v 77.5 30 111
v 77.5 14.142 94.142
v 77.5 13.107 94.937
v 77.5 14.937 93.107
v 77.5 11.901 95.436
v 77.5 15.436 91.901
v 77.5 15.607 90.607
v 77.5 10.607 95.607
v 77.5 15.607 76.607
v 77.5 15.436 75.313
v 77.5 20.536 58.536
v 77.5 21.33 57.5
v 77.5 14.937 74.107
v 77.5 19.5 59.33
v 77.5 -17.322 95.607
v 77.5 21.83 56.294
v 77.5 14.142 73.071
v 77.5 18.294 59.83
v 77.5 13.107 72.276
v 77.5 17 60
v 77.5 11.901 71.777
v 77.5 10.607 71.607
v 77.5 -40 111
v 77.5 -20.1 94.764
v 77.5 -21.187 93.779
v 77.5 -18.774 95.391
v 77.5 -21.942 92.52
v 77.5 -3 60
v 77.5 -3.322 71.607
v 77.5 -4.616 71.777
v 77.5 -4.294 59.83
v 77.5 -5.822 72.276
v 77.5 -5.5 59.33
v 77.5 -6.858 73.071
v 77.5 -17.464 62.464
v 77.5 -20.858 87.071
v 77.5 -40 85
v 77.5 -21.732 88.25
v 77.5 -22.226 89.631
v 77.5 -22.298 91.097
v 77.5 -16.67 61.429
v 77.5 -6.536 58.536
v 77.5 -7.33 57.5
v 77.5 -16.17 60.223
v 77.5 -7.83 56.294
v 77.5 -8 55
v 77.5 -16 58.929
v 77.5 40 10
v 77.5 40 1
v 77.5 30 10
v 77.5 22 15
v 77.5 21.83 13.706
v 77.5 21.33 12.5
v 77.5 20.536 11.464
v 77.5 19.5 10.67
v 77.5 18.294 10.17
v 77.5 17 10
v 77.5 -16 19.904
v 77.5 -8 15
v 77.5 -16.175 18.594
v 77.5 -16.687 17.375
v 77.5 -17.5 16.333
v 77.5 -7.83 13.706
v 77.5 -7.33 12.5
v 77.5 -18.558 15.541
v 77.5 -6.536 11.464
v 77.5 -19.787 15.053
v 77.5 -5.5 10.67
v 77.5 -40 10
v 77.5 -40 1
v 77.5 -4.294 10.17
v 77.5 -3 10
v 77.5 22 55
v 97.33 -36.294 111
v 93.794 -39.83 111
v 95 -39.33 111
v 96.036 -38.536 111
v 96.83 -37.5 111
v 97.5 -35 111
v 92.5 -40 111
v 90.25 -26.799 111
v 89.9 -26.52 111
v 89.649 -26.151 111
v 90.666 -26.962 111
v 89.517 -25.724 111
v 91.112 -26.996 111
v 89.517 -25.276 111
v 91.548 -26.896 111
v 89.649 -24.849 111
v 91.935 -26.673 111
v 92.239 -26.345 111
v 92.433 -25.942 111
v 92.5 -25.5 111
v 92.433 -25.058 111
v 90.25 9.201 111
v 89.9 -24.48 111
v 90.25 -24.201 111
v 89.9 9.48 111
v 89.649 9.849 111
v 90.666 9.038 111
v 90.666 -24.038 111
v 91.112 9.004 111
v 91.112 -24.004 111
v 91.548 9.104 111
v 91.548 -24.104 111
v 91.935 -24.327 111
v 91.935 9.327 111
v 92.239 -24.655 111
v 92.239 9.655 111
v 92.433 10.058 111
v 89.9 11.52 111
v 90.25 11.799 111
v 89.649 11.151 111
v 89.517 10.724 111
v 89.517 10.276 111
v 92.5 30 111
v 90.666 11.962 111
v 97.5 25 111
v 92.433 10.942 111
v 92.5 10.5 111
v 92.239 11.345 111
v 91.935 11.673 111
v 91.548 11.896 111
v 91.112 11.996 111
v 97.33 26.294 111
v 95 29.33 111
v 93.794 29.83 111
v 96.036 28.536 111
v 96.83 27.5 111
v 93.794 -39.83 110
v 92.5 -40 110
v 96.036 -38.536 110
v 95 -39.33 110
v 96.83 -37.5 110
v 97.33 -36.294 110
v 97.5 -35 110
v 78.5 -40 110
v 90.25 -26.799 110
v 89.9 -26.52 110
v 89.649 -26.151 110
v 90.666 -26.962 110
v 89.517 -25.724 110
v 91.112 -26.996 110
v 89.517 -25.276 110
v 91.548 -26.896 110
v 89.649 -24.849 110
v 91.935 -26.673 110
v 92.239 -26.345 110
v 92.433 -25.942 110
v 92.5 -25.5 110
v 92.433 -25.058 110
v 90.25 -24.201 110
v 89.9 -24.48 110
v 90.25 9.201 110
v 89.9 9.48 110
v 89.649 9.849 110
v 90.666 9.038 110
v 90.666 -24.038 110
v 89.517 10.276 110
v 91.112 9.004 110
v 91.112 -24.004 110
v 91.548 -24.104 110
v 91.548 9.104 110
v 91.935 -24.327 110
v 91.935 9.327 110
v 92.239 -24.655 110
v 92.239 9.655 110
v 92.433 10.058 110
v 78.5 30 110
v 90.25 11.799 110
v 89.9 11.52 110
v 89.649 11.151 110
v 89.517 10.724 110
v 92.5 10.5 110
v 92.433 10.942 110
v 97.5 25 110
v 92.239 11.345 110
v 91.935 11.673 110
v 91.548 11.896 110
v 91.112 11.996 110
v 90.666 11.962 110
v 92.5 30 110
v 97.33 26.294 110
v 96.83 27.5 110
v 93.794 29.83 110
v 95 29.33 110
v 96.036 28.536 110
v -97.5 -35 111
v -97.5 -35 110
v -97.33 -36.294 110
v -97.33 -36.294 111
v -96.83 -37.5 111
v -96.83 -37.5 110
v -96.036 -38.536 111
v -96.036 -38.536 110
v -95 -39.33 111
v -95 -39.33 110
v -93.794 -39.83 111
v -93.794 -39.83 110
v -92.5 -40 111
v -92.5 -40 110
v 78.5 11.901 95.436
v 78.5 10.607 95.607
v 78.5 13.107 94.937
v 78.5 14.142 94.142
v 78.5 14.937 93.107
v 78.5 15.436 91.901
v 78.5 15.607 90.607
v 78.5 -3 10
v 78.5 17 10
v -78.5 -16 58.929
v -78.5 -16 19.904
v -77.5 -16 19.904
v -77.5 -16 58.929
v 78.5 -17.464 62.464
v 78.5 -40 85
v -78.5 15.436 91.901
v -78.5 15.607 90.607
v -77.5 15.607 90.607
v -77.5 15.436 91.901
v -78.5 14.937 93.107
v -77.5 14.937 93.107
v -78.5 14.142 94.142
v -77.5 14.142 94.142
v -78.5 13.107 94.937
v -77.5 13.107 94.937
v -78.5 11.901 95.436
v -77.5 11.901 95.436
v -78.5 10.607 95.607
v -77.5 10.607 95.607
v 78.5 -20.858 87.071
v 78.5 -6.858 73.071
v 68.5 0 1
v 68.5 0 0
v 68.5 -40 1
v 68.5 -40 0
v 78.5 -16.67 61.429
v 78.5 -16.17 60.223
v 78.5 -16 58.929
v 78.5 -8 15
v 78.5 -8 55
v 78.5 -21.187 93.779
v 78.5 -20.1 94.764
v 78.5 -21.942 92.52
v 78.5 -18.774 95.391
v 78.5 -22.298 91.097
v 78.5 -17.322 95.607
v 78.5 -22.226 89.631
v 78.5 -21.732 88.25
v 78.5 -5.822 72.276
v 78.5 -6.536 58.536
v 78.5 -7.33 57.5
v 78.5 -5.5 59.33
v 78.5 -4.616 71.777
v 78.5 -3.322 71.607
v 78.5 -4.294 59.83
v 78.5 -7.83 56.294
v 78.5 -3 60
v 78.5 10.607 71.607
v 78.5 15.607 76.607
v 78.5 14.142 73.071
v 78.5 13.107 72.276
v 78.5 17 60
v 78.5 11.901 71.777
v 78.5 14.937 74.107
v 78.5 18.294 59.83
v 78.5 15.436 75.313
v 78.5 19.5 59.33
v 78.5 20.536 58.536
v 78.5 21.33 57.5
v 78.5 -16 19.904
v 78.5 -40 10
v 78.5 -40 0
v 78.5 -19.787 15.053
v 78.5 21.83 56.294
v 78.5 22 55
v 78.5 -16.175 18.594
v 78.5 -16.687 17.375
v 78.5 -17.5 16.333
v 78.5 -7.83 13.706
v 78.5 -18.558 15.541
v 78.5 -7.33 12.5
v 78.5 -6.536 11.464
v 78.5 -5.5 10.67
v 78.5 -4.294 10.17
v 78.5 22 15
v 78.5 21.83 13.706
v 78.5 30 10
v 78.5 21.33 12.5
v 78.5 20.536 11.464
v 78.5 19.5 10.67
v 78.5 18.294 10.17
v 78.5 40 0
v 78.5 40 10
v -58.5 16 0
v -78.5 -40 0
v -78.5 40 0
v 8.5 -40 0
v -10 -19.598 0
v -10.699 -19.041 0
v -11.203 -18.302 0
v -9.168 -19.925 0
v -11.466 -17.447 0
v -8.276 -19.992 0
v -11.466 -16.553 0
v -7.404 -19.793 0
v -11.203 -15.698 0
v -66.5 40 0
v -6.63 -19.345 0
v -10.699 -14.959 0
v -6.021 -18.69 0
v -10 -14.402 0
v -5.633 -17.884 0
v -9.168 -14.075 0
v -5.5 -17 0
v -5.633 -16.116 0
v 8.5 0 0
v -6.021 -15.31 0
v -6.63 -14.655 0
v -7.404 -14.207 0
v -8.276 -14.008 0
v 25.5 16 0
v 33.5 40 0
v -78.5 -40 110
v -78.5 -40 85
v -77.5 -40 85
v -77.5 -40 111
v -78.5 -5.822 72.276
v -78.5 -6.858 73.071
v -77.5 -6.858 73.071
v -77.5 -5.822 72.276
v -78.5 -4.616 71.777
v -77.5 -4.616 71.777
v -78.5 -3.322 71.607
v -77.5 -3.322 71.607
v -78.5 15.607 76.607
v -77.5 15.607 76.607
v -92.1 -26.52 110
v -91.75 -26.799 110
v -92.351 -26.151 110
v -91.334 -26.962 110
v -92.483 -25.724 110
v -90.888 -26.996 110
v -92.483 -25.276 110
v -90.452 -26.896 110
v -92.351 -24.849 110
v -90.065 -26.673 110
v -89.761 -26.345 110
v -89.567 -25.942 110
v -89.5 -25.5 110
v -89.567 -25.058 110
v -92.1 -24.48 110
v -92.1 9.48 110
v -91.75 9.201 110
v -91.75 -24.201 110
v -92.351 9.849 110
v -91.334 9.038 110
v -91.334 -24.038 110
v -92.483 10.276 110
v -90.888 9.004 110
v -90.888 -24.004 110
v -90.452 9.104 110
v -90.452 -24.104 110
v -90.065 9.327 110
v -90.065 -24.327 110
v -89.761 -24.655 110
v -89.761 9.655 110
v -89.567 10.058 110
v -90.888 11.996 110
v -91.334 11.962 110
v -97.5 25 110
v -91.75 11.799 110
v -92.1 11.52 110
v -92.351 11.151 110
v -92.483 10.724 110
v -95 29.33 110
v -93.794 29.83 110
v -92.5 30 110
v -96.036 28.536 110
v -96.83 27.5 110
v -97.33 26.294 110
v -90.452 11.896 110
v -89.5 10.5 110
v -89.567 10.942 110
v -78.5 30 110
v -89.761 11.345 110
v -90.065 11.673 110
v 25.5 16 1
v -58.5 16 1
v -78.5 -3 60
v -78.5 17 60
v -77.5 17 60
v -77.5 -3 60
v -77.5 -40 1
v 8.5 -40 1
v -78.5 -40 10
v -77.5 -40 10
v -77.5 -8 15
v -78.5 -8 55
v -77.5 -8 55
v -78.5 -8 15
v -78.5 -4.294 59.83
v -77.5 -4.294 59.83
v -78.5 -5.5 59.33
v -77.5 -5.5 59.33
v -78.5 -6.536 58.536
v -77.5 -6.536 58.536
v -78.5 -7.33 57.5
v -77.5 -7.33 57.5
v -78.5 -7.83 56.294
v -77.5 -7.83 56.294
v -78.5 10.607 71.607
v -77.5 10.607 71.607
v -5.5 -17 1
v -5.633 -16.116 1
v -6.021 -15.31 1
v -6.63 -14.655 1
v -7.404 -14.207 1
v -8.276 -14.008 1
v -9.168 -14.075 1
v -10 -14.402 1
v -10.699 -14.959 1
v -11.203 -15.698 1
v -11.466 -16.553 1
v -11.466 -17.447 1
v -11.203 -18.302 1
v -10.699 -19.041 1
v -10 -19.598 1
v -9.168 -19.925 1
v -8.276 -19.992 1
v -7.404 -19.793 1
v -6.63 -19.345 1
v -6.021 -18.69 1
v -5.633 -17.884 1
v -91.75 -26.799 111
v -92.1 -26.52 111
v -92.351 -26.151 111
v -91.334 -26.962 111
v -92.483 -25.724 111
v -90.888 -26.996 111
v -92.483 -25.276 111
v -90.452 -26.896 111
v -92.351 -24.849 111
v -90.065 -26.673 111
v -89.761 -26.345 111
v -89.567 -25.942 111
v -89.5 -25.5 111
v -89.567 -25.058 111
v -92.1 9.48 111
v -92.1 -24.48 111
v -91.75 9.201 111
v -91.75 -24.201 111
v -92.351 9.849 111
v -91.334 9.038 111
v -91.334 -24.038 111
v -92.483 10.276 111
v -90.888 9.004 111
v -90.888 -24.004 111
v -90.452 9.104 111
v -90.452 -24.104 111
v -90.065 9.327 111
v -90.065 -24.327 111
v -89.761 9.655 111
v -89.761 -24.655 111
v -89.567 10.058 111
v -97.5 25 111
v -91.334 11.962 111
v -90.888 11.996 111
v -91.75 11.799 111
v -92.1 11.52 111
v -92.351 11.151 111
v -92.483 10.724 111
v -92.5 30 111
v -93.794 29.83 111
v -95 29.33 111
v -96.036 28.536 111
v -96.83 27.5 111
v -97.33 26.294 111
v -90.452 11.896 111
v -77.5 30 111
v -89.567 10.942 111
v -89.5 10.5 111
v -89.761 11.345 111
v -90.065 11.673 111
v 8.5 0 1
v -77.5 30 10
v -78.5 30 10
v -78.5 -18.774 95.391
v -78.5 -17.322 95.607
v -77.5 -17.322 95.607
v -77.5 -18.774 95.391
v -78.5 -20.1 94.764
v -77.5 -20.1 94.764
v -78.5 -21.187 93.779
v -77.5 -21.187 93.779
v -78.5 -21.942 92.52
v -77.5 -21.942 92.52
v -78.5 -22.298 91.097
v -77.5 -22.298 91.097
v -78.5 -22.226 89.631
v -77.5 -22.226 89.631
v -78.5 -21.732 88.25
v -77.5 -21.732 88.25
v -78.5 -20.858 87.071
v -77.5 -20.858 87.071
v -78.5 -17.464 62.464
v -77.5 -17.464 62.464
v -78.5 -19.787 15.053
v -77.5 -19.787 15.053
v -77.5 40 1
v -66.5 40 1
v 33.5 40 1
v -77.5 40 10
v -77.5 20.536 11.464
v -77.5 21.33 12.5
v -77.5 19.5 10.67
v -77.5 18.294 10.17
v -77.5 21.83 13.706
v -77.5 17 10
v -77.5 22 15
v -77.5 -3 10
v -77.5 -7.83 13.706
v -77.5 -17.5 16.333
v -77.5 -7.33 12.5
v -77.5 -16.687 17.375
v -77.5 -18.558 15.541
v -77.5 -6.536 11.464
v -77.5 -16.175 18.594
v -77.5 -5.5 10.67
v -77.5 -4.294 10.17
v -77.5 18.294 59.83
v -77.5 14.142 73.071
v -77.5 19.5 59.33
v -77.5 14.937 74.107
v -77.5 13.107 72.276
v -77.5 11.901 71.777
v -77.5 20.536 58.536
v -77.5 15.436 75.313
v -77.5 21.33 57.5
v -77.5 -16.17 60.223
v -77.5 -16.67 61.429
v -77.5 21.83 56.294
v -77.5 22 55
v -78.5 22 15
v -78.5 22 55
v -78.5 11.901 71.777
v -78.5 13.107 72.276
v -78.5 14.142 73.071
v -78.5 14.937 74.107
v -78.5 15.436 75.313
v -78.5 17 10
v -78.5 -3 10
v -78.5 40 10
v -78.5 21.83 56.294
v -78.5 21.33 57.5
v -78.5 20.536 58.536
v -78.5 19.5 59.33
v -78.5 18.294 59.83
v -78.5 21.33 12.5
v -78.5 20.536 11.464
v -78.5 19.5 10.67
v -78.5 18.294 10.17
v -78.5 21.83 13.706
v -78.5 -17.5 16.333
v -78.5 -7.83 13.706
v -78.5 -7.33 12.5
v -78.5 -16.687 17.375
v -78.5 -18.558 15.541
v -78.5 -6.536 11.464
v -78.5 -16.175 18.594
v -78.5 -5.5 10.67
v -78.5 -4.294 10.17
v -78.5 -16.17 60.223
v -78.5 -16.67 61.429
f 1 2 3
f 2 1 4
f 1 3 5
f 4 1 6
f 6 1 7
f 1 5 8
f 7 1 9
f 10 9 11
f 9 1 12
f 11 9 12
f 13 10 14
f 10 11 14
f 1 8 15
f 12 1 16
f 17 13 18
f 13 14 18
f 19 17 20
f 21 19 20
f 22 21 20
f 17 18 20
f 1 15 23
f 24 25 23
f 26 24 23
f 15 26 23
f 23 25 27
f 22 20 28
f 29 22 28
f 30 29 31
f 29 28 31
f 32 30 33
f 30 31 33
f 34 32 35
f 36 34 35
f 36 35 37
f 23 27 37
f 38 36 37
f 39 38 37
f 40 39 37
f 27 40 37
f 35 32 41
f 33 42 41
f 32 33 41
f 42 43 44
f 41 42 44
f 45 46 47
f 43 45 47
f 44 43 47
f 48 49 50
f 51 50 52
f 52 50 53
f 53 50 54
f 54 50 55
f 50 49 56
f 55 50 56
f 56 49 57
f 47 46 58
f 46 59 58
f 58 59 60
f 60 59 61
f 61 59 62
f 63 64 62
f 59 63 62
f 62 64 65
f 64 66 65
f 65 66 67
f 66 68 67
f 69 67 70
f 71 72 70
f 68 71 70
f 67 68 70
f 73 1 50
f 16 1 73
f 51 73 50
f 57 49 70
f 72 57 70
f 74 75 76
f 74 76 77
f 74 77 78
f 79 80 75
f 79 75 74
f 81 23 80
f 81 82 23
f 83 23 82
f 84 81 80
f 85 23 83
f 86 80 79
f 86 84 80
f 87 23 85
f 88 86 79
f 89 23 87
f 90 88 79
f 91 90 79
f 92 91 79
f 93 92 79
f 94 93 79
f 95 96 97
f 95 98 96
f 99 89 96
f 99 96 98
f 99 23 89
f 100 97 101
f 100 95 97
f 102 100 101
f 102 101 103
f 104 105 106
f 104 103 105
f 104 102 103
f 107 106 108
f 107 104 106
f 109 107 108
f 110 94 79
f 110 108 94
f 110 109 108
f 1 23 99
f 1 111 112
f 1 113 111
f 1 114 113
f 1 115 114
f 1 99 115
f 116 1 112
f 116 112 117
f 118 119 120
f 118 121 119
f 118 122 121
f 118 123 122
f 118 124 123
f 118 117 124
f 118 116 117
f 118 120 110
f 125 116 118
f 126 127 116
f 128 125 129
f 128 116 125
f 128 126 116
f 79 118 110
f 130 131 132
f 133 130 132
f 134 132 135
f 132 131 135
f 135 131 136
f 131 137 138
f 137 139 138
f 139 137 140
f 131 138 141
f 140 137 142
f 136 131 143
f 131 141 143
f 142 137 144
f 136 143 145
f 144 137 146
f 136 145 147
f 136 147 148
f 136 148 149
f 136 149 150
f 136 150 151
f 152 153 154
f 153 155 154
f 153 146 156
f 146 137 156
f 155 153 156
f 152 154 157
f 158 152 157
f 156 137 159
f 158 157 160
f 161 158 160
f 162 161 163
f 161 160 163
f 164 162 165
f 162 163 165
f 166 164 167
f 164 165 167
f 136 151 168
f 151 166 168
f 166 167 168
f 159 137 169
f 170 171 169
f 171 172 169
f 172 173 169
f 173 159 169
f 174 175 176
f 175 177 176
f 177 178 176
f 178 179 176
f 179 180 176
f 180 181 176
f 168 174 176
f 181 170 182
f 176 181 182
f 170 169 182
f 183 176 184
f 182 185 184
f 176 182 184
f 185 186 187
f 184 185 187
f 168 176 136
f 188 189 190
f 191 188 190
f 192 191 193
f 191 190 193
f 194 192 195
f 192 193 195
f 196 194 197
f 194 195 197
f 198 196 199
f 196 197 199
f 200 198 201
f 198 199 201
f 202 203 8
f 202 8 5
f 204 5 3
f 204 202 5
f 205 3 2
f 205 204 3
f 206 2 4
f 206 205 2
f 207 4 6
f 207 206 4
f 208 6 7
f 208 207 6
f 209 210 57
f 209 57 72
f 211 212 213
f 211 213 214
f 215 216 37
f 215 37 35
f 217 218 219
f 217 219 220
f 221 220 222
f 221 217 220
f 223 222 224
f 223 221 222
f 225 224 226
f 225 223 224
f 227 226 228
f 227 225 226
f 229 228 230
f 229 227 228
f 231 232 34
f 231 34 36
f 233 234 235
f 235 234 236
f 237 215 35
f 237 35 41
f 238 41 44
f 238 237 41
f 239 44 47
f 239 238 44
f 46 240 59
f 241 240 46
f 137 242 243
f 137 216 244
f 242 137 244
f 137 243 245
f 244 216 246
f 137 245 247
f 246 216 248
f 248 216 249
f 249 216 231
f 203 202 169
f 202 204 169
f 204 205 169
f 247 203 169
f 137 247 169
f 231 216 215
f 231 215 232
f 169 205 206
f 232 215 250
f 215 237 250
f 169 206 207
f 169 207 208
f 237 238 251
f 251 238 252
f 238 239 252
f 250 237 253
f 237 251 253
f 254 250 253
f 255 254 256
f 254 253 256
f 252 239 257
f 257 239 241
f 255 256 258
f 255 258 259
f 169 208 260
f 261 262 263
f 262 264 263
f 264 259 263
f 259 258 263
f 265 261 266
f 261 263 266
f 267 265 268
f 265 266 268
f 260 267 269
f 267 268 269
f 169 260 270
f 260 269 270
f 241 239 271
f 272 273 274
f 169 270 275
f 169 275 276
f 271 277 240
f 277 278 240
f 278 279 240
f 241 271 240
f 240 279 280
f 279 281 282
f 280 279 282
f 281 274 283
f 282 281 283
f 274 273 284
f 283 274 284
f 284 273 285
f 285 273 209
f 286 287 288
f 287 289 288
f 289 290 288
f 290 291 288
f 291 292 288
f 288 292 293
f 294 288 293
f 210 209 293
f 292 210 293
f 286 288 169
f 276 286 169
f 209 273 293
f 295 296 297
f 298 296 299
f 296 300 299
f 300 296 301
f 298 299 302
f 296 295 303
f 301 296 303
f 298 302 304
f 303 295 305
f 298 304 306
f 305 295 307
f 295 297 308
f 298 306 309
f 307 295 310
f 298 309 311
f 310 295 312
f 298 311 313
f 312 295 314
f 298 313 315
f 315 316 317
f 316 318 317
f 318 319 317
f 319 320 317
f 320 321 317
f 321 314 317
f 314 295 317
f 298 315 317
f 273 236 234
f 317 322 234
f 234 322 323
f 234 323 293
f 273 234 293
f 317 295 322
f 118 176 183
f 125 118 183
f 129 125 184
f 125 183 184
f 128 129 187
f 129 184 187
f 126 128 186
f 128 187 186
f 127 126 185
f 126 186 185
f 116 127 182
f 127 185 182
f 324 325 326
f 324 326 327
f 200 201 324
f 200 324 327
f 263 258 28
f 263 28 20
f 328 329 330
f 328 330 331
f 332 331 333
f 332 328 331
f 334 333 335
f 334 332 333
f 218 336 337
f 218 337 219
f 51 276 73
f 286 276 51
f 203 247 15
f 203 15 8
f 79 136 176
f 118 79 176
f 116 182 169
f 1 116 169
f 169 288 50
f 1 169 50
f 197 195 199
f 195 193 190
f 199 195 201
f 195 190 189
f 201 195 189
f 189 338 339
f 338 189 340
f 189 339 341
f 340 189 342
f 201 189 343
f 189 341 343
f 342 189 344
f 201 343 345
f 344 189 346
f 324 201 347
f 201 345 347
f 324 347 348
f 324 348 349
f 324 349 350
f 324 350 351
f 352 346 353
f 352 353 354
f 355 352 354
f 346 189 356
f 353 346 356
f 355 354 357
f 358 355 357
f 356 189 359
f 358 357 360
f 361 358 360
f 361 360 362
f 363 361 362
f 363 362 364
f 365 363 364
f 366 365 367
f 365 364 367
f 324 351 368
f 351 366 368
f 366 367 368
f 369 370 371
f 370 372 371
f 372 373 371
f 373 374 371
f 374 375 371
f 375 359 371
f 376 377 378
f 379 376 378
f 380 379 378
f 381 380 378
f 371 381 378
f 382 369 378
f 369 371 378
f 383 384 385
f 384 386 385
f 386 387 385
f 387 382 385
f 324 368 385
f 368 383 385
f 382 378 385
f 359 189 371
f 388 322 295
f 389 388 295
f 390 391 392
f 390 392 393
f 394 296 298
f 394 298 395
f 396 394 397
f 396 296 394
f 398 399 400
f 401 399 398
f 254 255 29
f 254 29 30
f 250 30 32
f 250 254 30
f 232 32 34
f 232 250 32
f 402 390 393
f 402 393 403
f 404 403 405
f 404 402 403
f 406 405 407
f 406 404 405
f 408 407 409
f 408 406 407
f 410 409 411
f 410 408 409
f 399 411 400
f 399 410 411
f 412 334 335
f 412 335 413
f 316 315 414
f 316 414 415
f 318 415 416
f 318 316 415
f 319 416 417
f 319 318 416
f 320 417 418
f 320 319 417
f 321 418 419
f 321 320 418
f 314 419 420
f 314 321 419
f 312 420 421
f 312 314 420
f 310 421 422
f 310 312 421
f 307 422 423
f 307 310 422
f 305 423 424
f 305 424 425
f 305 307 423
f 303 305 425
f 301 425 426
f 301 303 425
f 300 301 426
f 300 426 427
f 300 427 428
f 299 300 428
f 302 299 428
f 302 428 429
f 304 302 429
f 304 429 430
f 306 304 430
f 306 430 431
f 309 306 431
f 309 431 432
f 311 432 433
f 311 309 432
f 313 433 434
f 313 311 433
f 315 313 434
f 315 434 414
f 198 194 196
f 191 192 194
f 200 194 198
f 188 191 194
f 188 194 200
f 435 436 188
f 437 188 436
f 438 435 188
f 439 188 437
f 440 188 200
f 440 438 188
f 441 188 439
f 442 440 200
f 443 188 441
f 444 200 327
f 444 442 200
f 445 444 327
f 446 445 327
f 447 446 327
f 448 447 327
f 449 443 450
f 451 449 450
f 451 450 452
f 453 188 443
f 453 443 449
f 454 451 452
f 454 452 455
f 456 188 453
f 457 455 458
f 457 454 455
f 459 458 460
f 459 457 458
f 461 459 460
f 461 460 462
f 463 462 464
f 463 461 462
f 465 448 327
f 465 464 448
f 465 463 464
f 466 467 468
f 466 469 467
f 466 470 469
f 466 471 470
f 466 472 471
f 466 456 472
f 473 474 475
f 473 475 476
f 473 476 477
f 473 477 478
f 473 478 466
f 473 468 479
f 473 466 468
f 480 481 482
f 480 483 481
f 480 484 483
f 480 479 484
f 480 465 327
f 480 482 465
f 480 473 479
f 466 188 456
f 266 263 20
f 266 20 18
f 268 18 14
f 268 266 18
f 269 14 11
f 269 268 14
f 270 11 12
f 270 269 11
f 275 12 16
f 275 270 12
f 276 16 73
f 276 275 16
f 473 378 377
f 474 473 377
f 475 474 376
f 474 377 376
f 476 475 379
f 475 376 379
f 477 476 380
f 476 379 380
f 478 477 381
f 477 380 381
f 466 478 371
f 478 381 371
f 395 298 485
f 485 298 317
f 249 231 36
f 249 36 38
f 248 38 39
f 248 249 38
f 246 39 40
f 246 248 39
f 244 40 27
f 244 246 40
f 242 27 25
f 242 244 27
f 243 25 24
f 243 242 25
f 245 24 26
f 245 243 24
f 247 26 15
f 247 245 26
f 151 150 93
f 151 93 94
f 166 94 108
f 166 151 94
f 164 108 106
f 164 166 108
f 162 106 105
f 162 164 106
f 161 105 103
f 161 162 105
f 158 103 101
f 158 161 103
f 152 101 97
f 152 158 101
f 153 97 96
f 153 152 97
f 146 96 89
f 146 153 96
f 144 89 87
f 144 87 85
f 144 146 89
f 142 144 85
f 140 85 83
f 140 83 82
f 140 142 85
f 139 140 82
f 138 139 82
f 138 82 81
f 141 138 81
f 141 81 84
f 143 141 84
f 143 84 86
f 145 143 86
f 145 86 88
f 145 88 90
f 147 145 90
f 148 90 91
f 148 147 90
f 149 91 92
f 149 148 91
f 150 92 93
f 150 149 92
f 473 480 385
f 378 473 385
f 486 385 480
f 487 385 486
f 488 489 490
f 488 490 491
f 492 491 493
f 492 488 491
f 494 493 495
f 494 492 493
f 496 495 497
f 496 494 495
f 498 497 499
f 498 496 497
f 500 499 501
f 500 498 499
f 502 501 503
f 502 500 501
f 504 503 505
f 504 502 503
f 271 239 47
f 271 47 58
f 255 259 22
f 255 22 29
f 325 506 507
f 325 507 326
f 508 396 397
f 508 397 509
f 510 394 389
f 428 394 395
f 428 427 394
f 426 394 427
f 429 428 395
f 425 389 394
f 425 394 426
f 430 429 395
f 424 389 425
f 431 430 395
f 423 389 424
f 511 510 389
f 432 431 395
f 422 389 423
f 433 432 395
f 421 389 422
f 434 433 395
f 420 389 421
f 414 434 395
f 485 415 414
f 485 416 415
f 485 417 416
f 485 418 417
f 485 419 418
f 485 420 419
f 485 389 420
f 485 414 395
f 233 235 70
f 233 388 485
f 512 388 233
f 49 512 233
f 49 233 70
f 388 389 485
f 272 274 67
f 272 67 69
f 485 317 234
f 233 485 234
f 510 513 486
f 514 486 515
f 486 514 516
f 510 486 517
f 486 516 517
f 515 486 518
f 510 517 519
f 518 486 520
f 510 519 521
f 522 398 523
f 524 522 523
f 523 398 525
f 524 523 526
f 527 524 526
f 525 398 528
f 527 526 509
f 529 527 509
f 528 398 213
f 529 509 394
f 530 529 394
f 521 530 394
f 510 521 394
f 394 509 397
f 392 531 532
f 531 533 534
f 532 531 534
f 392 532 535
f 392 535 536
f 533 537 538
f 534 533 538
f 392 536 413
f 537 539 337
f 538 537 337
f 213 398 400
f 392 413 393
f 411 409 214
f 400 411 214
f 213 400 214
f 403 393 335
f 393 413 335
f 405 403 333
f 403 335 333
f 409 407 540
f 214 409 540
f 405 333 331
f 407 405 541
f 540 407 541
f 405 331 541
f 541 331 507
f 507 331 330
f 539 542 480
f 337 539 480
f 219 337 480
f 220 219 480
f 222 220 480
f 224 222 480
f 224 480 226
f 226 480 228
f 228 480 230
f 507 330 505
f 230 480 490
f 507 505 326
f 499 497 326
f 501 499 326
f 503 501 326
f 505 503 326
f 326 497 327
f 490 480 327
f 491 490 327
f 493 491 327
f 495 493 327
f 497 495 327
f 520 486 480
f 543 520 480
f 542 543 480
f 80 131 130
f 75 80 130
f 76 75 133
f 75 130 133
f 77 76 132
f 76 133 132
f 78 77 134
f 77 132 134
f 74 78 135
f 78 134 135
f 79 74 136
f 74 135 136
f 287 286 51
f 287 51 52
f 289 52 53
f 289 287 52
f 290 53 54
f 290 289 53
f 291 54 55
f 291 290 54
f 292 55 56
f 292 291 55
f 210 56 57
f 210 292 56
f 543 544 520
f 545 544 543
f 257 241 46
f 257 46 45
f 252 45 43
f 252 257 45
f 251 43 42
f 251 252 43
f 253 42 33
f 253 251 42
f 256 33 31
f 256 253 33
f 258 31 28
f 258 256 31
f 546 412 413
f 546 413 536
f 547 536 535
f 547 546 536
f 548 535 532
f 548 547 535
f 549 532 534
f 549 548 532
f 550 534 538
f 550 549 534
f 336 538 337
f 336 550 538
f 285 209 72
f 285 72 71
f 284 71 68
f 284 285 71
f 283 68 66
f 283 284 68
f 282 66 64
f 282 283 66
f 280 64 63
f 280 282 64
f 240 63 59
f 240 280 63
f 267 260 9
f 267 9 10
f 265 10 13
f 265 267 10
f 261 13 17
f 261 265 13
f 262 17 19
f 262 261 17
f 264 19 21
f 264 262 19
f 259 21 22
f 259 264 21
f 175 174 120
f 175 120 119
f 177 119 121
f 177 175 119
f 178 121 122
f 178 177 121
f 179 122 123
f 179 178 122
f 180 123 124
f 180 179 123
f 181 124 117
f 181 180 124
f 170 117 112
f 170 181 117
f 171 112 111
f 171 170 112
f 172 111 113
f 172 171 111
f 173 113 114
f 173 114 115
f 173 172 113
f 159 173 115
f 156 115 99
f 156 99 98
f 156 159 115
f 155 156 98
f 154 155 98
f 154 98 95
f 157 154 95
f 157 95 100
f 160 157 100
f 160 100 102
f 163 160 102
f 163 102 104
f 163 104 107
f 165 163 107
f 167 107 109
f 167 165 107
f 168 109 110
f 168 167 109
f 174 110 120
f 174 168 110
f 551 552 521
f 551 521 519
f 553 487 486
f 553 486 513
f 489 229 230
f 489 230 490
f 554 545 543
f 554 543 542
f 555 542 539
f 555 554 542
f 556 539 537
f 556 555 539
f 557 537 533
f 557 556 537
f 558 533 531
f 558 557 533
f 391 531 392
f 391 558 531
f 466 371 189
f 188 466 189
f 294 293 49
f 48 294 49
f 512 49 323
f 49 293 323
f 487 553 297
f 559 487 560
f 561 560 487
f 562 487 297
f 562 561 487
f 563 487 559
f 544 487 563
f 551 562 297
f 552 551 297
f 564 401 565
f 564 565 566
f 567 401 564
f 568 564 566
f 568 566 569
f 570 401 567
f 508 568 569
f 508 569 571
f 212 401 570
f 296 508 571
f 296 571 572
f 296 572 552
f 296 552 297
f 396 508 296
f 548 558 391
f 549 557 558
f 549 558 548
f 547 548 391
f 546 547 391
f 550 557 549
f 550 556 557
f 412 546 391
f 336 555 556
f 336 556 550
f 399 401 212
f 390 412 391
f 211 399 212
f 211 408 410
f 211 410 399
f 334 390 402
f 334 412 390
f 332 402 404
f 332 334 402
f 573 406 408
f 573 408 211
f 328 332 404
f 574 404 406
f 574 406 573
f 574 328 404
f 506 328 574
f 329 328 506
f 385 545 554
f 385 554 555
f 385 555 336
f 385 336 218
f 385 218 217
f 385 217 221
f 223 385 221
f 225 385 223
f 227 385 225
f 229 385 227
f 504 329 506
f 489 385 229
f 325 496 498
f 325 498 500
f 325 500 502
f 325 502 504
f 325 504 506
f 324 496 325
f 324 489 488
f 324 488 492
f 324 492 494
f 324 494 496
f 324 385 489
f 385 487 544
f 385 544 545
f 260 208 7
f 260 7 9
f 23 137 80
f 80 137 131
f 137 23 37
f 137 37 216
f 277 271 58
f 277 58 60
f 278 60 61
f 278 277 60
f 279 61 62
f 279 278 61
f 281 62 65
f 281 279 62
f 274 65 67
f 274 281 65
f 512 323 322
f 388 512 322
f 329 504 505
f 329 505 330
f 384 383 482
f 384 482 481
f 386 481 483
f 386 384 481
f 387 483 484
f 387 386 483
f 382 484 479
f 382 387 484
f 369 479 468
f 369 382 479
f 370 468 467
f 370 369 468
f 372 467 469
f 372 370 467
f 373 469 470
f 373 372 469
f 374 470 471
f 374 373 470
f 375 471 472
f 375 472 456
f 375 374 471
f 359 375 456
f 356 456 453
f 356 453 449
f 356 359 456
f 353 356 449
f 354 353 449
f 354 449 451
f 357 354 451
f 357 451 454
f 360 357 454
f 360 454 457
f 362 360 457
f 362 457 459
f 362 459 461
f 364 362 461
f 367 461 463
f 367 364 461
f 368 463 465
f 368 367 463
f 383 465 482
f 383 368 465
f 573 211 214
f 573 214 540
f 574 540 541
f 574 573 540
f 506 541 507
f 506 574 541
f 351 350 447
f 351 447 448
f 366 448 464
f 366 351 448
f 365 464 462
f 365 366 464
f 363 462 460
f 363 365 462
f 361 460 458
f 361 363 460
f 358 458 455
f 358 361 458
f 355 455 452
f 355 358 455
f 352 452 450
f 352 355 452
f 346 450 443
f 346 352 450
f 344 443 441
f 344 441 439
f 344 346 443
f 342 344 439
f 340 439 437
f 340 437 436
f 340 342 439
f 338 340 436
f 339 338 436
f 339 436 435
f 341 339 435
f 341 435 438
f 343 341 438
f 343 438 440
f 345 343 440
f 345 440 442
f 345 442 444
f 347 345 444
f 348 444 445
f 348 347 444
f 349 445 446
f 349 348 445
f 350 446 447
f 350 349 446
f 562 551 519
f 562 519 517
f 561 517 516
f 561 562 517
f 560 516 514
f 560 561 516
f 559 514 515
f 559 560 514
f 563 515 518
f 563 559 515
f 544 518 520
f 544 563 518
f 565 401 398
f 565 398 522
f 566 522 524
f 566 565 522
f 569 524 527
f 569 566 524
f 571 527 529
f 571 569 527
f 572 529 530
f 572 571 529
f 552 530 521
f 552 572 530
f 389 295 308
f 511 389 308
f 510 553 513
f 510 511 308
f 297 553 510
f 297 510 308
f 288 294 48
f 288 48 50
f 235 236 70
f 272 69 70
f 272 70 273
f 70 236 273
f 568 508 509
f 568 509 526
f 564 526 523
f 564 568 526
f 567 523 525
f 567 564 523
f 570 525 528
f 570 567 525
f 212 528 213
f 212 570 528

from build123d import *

# Parameters (mm, degrees)
F0_R     = 3
F1_DEPTH = 1
F3_DEPTH = 1
F5_DEPTH = 1
F6_R     = 1.5
F7_DEPTH = 1


with BuildPart() as f1:
    # F0 (on Top) → F1 (new body)
    with BuildSketch(Plane.XY):
        Polygon((68.5, -40), (78.5, -40), (78.5, 40), (33.5, 40), (25.5, 16), (-58.5, 16), (-66.5, 40), (-78.5, 40), (-78.5, -40), (8.5, -40), (8.5, 0), (68.5, 0), align=None)
        with Locations((-8.5, -17)):
            Circle(F0_R, mode=Mode.SUBTRACT)
    extrude(amount=F1_DEPTH)

    # F2 (on face) → F3 (join)
    with BuildSketch(Plane(origin=(-78.5, 0, 0), x_dir=(0, -1, 0), z_dir=(-1, 0, 0))):
        with BuildLine():
            Line((-40, 1), (40, 1))
            Line((40, 1), (40, 10))
            Line((40, 10), (19.787322, 15.05317))
            ThreePointArc((19.787322, 15.05317), (17.058973, 16.826821), (16, 19.903882))
            Line((16, 19.903882), (16, 58.928932))
            ThreePointArc((16, 58.928932), (16.380602, 60.842349), (17.464466, 62.464466))
            Line((17.464466, 62.464466), (40, 85))
            Line((40, 85), (40, 110))
            Line((40, 110), (-30, 110))
            Line((-30, 110), (-30, 10))
            Line((-30, 10), (-40, 10))
            Line((-40, 10), (-40, 1))
        make_face()
        with BuildLine():
            ThreePointArc((-22, 55), (-20.535534, 58.535534), (-17, 60))
            Line((-17, 60), (3, 60))
            ThreePointArc((3, 60), (6.535534, 58.535534), (8, 55))
            Line((8, 55), (8, 15))
            ThreePointArc((8, 15), (6.535534, 11.464466), (3, 10))
            Line((3, 10), (-17, 10))
            ThreePointArc((-17, 10), (-20.535534, 11.464466), (-22, 15))
            Line((-22, 15), (-22, 55))
        make_face(mode=Mode.SUBTRACT)
        with BuildLine():
            ThreePointArc((17.32233, 95.606602), (21.941728, 92.520019), (20.857864, 87.071068))
            Line((20.857864, 87.071068), (6.857864, 73.071068))
            ThreePointArc((6.857864, 73.071068), (5.235748, 71.987204), (3.32233, 71.606602))
            Line((3.32233, 71.606602), (-10.606602, 71.606602))
            ThreePointArc((-10.606602, 71.606602), (-14.142136, 73.071068), (-15.606602, 76.606602))
            Line((-15.606602, 76.606602), (-15.606602, 90.606602))
            ThreePointArc((-15.606602, 90.606602), (-14.142136, 94.142136), (-10.606602, 95.606602))
            Line((-10.606602, 95.606602), (17.32233, 95.606602))
        make_face(mode=Mode.SUBTRACT)
    extrude(amount=-F3_DEPTH)

    # F4 (on face) → F5 (join)
    with BuildSketch(Plane.YZ.offset(78.5)):
        with BuildLine():
            Line((-40, 0), (40, 0))
            Line((40, 0), (40, 10))
            Line((40, 10), (30, 10))
            Line((30, 10), (30, 110))
            Line((30, 110), (-40, 110))
            Line((-40, 110), (-40, 85))
            Line((-40, 85), (-17.464466, 62.464466))
            ThreePointArc((-17.464466, 62.464466), (-16.380602, 60.842349), (-16, 58.928932))
            Line((-16, 58.928932), (-16, 19.903882))
            ThreePointArc((-16, 19.903882), (-17.058973, 16.826821), (-19.787322, 15.05317))
            Line((-19.787322, 15.05317), (-40, 10))
            Line((-40, 10), (-40, 0))
        make_face()
        with BuildLine():
            Line((-3, 60), (17, 60))
            ThreePointArc((17, 60), (20.535534, 58.535534), (22, 55))
            Line((22, 55), (22, 15))
            ThreePointArc((22, 15), (20.535534, 11.464466), (17, 10))
            Line((17, 10), (-3, 10))
            ThreePointArc((-3, 10), (-6.535534, 11.464466), (-8, 15))
            Line((-8, 15), (-8, 55))
            ThreePointArc((-8, 55), (-6.535534, 58.535534), (-3, 60))
        make_face(mode=Mode.SUBTRACT)
        with BuildLine():
            Line((-6.857864, 73.071068), (-20.857864, 87.071068))
            ThreePointArc((-20.857864, 87.071068), (-21.941728, 92.520019), (-17.32233, 95.606602))
            Line((-17.32233, 95.606602), (10.606602, 95.606602))
            ThreePointArc((10.606602, 95.606602), (14.142136, 94.142136), (15.606602, 90.606602))
            Line((15.606602, 90.606602), (15.606602, 76.606602))
            ThreePointArc((15.606602, 76.606602), (14.142136, 73.071068), (10.606602, 71.606602))
            Line((10.606602, 71.606602), (-3.32233, 71.606602))
            ThreePointArc((-3.32233, 71.606602), (-5.235748, 71.987204), (-6.857864, 73.071068))
        make_face(mode=Mode.SUBTRACT)
    extrude(amount=-F5_DEPTH)

    # F6 (on face) → F7 (join)
    with BuildSketch(Plane.XY.offset(110)):
        with BuildLine():
            Line((77.5, 30), (77.5, -40))
            Line((77.5, -40), (92.5, -40))
            ThreePointArc((92.5, -40), (96.035534, -38.535534), (97.5, -35))
            Line((97.5, -35), (97.5, 25))
            ThreePointArc((97.5, 25), (96.035534, 28.535534), (92.5, 30))
            Line((92.5, 30), (77.5, 30))
        make_face()
        with Locations((91, -25.5)):
            Circle(F6_R, mode=Mode.SUBTRACT)
        with Locations((91, 10.5)):
            Circle(F6_R, mode=Mode.SUBTRACT)
        with BuildLine():
            ThreePointArc((-92.5, 30), (-96.035534, 28.535534), (-97.5, 25))
            Line((-97.5, 25), (-97.5, -35))
            ThreePointArc((-97.5, -35), (-96.035534, -38.535534), (-92.5, -40))
            Line((-92.5, -40), (-77.5, -40))
            Line((-77.5, -40), (-77.5, 30))
            Line((-77.5, 30), (-92.5, 30))
        make_face()
        with Locations((-91, -25.5)):
            Circle(F6_R, mode=Mode.SUBTRACT)
        with Locations((-91, 10.5)):
            Circle(F6_R, mode=Mode.SUBTRACT)
    extrude(amount=F7_DEPTH)


solid = f1.part
